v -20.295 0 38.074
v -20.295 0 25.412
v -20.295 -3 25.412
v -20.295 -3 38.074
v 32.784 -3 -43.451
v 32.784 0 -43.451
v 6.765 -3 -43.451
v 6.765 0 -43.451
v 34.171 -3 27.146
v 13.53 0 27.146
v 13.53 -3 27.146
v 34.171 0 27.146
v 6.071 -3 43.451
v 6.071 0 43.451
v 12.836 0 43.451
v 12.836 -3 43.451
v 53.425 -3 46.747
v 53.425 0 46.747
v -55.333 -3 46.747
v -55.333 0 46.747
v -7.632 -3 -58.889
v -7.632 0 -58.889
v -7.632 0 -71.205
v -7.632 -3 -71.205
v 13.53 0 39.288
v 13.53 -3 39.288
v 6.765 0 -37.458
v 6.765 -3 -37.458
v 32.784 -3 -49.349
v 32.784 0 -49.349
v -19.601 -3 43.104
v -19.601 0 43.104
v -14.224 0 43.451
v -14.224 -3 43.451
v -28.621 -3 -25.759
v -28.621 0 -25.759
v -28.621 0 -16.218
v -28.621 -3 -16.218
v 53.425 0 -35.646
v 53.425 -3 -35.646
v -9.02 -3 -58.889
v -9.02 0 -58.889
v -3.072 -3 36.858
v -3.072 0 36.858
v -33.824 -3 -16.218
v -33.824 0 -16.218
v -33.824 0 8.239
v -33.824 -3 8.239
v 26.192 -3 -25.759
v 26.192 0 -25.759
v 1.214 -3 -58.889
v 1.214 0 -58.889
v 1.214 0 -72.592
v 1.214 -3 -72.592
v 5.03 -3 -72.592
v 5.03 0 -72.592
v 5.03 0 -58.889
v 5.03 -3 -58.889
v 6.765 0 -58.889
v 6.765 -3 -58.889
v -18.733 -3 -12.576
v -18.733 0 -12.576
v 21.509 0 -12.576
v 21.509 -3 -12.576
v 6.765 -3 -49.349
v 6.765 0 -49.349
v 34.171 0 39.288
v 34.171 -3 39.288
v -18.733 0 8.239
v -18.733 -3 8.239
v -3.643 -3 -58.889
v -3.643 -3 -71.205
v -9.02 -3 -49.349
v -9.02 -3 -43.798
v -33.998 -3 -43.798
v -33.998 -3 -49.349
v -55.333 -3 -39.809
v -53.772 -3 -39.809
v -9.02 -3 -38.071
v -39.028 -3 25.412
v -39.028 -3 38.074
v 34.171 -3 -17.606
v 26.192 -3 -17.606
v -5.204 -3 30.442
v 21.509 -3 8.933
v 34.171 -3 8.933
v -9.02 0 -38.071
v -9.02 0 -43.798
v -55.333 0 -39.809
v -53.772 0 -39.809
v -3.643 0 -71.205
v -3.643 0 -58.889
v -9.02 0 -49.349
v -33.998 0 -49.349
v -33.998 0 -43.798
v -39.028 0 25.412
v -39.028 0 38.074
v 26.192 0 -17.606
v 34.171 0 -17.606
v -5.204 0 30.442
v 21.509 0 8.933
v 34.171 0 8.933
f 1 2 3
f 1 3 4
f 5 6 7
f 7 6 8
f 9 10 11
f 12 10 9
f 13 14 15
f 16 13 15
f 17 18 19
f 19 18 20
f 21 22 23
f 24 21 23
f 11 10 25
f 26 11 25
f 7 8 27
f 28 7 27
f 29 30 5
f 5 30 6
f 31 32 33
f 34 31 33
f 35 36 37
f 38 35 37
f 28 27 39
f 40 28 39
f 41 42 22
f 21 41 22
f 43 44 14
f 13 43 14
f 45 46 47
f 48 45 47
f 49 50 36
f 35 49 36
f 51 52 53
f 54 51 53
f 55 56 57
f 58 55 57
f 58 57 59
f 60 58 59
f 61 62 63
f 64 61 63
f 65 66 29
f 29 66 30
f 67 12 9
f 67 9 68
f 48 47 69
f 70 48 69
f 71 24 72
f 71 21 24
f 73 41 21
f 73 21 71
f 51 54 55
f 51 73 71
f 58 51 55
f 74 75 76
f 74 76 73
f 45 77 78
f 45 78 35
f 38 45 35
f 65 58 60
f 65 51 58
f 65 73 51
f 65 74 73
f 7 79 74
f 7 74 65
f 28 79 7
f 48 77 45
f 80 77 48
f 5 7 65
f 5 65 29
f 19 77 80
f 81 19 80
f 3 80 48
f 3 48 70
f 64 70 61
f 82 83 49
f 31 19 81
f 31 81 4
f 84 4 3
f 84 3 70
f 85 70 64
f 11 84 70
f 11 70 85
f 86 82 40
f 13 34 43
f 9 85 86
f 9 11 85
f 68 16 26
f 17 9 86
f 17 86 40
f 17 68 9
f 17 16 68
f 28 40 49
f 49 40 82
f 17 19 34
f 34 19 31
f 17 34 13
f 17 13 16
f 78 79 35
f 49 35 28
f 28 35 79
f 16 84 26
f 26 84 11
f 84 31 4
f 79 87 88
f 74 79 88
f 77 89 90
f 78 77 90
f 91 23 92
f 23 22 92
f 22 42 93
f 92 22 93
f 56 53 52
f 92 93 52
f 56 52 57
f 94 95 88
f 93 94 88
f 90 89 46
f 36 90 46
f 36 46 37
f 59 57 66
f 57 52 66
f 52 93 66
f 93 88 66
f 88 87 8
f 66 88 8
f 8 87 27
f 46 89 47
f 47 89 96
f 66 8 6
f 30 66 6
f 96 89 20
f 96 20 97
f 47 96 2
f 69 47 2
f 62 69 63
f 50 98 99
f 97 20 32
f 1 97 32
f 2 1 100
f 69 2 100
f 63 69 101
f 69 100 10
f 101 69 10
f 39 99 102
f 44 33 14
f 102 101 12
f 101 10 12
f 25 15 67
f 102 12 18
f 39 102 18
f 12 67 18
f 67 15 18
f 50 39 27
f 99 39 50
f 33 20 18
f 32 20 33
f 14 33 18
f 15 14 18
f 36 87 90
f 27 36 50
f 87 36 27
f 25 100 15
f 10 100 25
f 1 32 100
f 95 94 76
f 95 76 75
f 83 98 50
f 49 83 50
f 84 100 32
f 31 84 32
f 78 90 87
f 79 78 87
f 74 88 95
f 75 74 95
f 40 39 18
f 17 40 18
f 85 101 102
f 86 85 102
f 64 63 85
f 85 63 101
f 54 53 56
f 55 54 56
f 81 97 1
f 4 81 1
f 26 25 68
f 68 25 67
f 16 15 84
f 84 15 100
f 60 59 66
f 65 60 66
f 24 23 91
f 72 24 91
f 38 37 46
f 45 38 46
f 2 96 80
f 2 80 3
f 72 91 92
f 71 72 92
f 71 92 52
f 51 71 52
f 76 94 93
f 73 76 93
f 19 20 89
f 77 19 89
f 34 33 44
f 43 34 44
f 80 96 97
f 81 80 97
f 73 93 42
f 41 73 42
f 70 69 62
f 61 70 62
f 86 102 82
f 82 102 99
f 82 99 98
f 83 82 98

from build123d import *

# Parameters (mm, degrees)
F0_W     = 3.9895381778
F0_H     = 12.3155266047
F0_W_2   = 3.8160792319
F0_H_2   = 13.7031897902
F0_W_3   = 24.9779764563
F0_H_3   = 5.550660193
F0_W_4   = 26.0187210515
F0_H_4   = 5.897577852
F0_H_5   = 3.1222477555
F0_H_6   = 2.2549591959
F0_W_5   = 2.2549559362
F0_W_6   = 3.8160814438
F0_W_7   = 18.7334809452
F0_H_7   = 12.6624442637
F0_W_8   = 20.6415196881
F0_H_8   = 12.1420696378
F1_DEPTH = 3


with BuildPart() as f1:
    # F0 (on Front) → F1 (new body)
    with BuildSketch(Plane.XZ):
        with Locations((-5.6373900734, -65.0468096137)):
            Rectangle(F0_W, F0_H)
        with Locations((3.1222468824, -65.7406412065)):
            Rectangle(F0_W_2, F0_H_2)
        with Locations((-21.508811973, -46.5735159814)):
            Rectangle(F0_W_3, F0_H_3)
        with Locations((19.7742297314, -46.4000571519)):
            Rectangle(F0_W_4, F0_H_4)
        Polygon((-9.0198237449, -34.7783602774), (-9.0198237449, -38.0706993256), (6.7648692057, -37.4577013494), (6.7648692057, -34.7783602774), align=None)
        with Locations((-5.6373900734, -57.3279224336)):
            Rectangle(F0_W, F0_H_5)
        with Locations((3.1222468824, -57.7615667135)):
            Rectangle(F0_W_2, F0_H_6)
        with Locations((-7.8923457768, -46.5735159814)):
            Rectangle(F0_W_5, F0_H_3)
        with Locations((4.8568284838, -46.4000571519)):
            Rectangle(F0_W_6, F0_H_4)
        Polygon((6.7648692057, -37.4577013494), (-9.0198237449, -38.0706993256), (-9.0198237449, -43.798185885), (-6.7648678087, -43.798185885), (-6.7648678087, -49.3488460779), (-9.0198237449, -49.3488460779), (-9.0198237449, -58.8890463114), (-7.6321591623, -58.8890463114), (-7.6321591623, -55.7667985559), (-3.6426209845, -55.7667985559), (-3.6426209845, -58.8890463114), (1.2142072665, -58.8890463114), (1.2142072665, -56.6340871155), (5.0302864984, -56.6340871155), (5.0302864984, -58.8890463114), (6.7648692057, -58.8890463114), (6.7648692057, -49.3488460779), (2.9487877619, -49.3488460779), (2.9487877619, -43.4512682259), (6.7648692057, -43.4512682259), align=None)
        Polygon((-55.3331524134, 46.7469729483), (-55.3331524134, -39.8086495697), (-53.7720285356, -39.8086495697), (-9.0198237449, -38.0706993256), (-9.0198237449, -34.7783602774), (6.7648692057, -34.7783602774), (6.7648692057, -37.4577013494), (53.4251108766, -35.6456525624), (53.4251108766, 46.7469729483), align=None)
        with Locations((-29.6613452956, 31.742842868)):
            Rectangle(F0_W_7, F0_H_7, mode=Mode.SUBTRACT)
        Polygon((-5.2037448622, 30.4419063032), (-19.6007713675, 43.1043542922), (-14.2235690728, 43.4512682259), (-3.0722282925, 36.8575679841), (6.0710357502, 43.4512682259), (12.8359030932, 43.4512682259), align=None, mode=Mode.SUBTRACT)
        Polygon((-33.824339509, -16.2183362991), (-33.824339509, 8.2392627373), (-18.7334809452, 8.2392627373), (-18.7334809452, -12.5757167116), (21.5088110417, -12.5757167116), (21.5088110417, 8.9330952615), (34.1712571681, 8.9330952615), (34.1712571681, -17.6060032099), (26.192182675, -17.6060032099), (26.192182675, -25.7585346699), (-28.6205969751, -25.7585346699), (-28.6205969751, -16.2183362991), align=None, mode=Mode.SUBTRACT)
        with Locations((23.850497324, 33.2172363997)):
            Rectangle(F0_W_8, F0_H_8, mode=Mode.SUBTRACT)
    extrude(amount=F1_DEPTH)


solid = f1.part
